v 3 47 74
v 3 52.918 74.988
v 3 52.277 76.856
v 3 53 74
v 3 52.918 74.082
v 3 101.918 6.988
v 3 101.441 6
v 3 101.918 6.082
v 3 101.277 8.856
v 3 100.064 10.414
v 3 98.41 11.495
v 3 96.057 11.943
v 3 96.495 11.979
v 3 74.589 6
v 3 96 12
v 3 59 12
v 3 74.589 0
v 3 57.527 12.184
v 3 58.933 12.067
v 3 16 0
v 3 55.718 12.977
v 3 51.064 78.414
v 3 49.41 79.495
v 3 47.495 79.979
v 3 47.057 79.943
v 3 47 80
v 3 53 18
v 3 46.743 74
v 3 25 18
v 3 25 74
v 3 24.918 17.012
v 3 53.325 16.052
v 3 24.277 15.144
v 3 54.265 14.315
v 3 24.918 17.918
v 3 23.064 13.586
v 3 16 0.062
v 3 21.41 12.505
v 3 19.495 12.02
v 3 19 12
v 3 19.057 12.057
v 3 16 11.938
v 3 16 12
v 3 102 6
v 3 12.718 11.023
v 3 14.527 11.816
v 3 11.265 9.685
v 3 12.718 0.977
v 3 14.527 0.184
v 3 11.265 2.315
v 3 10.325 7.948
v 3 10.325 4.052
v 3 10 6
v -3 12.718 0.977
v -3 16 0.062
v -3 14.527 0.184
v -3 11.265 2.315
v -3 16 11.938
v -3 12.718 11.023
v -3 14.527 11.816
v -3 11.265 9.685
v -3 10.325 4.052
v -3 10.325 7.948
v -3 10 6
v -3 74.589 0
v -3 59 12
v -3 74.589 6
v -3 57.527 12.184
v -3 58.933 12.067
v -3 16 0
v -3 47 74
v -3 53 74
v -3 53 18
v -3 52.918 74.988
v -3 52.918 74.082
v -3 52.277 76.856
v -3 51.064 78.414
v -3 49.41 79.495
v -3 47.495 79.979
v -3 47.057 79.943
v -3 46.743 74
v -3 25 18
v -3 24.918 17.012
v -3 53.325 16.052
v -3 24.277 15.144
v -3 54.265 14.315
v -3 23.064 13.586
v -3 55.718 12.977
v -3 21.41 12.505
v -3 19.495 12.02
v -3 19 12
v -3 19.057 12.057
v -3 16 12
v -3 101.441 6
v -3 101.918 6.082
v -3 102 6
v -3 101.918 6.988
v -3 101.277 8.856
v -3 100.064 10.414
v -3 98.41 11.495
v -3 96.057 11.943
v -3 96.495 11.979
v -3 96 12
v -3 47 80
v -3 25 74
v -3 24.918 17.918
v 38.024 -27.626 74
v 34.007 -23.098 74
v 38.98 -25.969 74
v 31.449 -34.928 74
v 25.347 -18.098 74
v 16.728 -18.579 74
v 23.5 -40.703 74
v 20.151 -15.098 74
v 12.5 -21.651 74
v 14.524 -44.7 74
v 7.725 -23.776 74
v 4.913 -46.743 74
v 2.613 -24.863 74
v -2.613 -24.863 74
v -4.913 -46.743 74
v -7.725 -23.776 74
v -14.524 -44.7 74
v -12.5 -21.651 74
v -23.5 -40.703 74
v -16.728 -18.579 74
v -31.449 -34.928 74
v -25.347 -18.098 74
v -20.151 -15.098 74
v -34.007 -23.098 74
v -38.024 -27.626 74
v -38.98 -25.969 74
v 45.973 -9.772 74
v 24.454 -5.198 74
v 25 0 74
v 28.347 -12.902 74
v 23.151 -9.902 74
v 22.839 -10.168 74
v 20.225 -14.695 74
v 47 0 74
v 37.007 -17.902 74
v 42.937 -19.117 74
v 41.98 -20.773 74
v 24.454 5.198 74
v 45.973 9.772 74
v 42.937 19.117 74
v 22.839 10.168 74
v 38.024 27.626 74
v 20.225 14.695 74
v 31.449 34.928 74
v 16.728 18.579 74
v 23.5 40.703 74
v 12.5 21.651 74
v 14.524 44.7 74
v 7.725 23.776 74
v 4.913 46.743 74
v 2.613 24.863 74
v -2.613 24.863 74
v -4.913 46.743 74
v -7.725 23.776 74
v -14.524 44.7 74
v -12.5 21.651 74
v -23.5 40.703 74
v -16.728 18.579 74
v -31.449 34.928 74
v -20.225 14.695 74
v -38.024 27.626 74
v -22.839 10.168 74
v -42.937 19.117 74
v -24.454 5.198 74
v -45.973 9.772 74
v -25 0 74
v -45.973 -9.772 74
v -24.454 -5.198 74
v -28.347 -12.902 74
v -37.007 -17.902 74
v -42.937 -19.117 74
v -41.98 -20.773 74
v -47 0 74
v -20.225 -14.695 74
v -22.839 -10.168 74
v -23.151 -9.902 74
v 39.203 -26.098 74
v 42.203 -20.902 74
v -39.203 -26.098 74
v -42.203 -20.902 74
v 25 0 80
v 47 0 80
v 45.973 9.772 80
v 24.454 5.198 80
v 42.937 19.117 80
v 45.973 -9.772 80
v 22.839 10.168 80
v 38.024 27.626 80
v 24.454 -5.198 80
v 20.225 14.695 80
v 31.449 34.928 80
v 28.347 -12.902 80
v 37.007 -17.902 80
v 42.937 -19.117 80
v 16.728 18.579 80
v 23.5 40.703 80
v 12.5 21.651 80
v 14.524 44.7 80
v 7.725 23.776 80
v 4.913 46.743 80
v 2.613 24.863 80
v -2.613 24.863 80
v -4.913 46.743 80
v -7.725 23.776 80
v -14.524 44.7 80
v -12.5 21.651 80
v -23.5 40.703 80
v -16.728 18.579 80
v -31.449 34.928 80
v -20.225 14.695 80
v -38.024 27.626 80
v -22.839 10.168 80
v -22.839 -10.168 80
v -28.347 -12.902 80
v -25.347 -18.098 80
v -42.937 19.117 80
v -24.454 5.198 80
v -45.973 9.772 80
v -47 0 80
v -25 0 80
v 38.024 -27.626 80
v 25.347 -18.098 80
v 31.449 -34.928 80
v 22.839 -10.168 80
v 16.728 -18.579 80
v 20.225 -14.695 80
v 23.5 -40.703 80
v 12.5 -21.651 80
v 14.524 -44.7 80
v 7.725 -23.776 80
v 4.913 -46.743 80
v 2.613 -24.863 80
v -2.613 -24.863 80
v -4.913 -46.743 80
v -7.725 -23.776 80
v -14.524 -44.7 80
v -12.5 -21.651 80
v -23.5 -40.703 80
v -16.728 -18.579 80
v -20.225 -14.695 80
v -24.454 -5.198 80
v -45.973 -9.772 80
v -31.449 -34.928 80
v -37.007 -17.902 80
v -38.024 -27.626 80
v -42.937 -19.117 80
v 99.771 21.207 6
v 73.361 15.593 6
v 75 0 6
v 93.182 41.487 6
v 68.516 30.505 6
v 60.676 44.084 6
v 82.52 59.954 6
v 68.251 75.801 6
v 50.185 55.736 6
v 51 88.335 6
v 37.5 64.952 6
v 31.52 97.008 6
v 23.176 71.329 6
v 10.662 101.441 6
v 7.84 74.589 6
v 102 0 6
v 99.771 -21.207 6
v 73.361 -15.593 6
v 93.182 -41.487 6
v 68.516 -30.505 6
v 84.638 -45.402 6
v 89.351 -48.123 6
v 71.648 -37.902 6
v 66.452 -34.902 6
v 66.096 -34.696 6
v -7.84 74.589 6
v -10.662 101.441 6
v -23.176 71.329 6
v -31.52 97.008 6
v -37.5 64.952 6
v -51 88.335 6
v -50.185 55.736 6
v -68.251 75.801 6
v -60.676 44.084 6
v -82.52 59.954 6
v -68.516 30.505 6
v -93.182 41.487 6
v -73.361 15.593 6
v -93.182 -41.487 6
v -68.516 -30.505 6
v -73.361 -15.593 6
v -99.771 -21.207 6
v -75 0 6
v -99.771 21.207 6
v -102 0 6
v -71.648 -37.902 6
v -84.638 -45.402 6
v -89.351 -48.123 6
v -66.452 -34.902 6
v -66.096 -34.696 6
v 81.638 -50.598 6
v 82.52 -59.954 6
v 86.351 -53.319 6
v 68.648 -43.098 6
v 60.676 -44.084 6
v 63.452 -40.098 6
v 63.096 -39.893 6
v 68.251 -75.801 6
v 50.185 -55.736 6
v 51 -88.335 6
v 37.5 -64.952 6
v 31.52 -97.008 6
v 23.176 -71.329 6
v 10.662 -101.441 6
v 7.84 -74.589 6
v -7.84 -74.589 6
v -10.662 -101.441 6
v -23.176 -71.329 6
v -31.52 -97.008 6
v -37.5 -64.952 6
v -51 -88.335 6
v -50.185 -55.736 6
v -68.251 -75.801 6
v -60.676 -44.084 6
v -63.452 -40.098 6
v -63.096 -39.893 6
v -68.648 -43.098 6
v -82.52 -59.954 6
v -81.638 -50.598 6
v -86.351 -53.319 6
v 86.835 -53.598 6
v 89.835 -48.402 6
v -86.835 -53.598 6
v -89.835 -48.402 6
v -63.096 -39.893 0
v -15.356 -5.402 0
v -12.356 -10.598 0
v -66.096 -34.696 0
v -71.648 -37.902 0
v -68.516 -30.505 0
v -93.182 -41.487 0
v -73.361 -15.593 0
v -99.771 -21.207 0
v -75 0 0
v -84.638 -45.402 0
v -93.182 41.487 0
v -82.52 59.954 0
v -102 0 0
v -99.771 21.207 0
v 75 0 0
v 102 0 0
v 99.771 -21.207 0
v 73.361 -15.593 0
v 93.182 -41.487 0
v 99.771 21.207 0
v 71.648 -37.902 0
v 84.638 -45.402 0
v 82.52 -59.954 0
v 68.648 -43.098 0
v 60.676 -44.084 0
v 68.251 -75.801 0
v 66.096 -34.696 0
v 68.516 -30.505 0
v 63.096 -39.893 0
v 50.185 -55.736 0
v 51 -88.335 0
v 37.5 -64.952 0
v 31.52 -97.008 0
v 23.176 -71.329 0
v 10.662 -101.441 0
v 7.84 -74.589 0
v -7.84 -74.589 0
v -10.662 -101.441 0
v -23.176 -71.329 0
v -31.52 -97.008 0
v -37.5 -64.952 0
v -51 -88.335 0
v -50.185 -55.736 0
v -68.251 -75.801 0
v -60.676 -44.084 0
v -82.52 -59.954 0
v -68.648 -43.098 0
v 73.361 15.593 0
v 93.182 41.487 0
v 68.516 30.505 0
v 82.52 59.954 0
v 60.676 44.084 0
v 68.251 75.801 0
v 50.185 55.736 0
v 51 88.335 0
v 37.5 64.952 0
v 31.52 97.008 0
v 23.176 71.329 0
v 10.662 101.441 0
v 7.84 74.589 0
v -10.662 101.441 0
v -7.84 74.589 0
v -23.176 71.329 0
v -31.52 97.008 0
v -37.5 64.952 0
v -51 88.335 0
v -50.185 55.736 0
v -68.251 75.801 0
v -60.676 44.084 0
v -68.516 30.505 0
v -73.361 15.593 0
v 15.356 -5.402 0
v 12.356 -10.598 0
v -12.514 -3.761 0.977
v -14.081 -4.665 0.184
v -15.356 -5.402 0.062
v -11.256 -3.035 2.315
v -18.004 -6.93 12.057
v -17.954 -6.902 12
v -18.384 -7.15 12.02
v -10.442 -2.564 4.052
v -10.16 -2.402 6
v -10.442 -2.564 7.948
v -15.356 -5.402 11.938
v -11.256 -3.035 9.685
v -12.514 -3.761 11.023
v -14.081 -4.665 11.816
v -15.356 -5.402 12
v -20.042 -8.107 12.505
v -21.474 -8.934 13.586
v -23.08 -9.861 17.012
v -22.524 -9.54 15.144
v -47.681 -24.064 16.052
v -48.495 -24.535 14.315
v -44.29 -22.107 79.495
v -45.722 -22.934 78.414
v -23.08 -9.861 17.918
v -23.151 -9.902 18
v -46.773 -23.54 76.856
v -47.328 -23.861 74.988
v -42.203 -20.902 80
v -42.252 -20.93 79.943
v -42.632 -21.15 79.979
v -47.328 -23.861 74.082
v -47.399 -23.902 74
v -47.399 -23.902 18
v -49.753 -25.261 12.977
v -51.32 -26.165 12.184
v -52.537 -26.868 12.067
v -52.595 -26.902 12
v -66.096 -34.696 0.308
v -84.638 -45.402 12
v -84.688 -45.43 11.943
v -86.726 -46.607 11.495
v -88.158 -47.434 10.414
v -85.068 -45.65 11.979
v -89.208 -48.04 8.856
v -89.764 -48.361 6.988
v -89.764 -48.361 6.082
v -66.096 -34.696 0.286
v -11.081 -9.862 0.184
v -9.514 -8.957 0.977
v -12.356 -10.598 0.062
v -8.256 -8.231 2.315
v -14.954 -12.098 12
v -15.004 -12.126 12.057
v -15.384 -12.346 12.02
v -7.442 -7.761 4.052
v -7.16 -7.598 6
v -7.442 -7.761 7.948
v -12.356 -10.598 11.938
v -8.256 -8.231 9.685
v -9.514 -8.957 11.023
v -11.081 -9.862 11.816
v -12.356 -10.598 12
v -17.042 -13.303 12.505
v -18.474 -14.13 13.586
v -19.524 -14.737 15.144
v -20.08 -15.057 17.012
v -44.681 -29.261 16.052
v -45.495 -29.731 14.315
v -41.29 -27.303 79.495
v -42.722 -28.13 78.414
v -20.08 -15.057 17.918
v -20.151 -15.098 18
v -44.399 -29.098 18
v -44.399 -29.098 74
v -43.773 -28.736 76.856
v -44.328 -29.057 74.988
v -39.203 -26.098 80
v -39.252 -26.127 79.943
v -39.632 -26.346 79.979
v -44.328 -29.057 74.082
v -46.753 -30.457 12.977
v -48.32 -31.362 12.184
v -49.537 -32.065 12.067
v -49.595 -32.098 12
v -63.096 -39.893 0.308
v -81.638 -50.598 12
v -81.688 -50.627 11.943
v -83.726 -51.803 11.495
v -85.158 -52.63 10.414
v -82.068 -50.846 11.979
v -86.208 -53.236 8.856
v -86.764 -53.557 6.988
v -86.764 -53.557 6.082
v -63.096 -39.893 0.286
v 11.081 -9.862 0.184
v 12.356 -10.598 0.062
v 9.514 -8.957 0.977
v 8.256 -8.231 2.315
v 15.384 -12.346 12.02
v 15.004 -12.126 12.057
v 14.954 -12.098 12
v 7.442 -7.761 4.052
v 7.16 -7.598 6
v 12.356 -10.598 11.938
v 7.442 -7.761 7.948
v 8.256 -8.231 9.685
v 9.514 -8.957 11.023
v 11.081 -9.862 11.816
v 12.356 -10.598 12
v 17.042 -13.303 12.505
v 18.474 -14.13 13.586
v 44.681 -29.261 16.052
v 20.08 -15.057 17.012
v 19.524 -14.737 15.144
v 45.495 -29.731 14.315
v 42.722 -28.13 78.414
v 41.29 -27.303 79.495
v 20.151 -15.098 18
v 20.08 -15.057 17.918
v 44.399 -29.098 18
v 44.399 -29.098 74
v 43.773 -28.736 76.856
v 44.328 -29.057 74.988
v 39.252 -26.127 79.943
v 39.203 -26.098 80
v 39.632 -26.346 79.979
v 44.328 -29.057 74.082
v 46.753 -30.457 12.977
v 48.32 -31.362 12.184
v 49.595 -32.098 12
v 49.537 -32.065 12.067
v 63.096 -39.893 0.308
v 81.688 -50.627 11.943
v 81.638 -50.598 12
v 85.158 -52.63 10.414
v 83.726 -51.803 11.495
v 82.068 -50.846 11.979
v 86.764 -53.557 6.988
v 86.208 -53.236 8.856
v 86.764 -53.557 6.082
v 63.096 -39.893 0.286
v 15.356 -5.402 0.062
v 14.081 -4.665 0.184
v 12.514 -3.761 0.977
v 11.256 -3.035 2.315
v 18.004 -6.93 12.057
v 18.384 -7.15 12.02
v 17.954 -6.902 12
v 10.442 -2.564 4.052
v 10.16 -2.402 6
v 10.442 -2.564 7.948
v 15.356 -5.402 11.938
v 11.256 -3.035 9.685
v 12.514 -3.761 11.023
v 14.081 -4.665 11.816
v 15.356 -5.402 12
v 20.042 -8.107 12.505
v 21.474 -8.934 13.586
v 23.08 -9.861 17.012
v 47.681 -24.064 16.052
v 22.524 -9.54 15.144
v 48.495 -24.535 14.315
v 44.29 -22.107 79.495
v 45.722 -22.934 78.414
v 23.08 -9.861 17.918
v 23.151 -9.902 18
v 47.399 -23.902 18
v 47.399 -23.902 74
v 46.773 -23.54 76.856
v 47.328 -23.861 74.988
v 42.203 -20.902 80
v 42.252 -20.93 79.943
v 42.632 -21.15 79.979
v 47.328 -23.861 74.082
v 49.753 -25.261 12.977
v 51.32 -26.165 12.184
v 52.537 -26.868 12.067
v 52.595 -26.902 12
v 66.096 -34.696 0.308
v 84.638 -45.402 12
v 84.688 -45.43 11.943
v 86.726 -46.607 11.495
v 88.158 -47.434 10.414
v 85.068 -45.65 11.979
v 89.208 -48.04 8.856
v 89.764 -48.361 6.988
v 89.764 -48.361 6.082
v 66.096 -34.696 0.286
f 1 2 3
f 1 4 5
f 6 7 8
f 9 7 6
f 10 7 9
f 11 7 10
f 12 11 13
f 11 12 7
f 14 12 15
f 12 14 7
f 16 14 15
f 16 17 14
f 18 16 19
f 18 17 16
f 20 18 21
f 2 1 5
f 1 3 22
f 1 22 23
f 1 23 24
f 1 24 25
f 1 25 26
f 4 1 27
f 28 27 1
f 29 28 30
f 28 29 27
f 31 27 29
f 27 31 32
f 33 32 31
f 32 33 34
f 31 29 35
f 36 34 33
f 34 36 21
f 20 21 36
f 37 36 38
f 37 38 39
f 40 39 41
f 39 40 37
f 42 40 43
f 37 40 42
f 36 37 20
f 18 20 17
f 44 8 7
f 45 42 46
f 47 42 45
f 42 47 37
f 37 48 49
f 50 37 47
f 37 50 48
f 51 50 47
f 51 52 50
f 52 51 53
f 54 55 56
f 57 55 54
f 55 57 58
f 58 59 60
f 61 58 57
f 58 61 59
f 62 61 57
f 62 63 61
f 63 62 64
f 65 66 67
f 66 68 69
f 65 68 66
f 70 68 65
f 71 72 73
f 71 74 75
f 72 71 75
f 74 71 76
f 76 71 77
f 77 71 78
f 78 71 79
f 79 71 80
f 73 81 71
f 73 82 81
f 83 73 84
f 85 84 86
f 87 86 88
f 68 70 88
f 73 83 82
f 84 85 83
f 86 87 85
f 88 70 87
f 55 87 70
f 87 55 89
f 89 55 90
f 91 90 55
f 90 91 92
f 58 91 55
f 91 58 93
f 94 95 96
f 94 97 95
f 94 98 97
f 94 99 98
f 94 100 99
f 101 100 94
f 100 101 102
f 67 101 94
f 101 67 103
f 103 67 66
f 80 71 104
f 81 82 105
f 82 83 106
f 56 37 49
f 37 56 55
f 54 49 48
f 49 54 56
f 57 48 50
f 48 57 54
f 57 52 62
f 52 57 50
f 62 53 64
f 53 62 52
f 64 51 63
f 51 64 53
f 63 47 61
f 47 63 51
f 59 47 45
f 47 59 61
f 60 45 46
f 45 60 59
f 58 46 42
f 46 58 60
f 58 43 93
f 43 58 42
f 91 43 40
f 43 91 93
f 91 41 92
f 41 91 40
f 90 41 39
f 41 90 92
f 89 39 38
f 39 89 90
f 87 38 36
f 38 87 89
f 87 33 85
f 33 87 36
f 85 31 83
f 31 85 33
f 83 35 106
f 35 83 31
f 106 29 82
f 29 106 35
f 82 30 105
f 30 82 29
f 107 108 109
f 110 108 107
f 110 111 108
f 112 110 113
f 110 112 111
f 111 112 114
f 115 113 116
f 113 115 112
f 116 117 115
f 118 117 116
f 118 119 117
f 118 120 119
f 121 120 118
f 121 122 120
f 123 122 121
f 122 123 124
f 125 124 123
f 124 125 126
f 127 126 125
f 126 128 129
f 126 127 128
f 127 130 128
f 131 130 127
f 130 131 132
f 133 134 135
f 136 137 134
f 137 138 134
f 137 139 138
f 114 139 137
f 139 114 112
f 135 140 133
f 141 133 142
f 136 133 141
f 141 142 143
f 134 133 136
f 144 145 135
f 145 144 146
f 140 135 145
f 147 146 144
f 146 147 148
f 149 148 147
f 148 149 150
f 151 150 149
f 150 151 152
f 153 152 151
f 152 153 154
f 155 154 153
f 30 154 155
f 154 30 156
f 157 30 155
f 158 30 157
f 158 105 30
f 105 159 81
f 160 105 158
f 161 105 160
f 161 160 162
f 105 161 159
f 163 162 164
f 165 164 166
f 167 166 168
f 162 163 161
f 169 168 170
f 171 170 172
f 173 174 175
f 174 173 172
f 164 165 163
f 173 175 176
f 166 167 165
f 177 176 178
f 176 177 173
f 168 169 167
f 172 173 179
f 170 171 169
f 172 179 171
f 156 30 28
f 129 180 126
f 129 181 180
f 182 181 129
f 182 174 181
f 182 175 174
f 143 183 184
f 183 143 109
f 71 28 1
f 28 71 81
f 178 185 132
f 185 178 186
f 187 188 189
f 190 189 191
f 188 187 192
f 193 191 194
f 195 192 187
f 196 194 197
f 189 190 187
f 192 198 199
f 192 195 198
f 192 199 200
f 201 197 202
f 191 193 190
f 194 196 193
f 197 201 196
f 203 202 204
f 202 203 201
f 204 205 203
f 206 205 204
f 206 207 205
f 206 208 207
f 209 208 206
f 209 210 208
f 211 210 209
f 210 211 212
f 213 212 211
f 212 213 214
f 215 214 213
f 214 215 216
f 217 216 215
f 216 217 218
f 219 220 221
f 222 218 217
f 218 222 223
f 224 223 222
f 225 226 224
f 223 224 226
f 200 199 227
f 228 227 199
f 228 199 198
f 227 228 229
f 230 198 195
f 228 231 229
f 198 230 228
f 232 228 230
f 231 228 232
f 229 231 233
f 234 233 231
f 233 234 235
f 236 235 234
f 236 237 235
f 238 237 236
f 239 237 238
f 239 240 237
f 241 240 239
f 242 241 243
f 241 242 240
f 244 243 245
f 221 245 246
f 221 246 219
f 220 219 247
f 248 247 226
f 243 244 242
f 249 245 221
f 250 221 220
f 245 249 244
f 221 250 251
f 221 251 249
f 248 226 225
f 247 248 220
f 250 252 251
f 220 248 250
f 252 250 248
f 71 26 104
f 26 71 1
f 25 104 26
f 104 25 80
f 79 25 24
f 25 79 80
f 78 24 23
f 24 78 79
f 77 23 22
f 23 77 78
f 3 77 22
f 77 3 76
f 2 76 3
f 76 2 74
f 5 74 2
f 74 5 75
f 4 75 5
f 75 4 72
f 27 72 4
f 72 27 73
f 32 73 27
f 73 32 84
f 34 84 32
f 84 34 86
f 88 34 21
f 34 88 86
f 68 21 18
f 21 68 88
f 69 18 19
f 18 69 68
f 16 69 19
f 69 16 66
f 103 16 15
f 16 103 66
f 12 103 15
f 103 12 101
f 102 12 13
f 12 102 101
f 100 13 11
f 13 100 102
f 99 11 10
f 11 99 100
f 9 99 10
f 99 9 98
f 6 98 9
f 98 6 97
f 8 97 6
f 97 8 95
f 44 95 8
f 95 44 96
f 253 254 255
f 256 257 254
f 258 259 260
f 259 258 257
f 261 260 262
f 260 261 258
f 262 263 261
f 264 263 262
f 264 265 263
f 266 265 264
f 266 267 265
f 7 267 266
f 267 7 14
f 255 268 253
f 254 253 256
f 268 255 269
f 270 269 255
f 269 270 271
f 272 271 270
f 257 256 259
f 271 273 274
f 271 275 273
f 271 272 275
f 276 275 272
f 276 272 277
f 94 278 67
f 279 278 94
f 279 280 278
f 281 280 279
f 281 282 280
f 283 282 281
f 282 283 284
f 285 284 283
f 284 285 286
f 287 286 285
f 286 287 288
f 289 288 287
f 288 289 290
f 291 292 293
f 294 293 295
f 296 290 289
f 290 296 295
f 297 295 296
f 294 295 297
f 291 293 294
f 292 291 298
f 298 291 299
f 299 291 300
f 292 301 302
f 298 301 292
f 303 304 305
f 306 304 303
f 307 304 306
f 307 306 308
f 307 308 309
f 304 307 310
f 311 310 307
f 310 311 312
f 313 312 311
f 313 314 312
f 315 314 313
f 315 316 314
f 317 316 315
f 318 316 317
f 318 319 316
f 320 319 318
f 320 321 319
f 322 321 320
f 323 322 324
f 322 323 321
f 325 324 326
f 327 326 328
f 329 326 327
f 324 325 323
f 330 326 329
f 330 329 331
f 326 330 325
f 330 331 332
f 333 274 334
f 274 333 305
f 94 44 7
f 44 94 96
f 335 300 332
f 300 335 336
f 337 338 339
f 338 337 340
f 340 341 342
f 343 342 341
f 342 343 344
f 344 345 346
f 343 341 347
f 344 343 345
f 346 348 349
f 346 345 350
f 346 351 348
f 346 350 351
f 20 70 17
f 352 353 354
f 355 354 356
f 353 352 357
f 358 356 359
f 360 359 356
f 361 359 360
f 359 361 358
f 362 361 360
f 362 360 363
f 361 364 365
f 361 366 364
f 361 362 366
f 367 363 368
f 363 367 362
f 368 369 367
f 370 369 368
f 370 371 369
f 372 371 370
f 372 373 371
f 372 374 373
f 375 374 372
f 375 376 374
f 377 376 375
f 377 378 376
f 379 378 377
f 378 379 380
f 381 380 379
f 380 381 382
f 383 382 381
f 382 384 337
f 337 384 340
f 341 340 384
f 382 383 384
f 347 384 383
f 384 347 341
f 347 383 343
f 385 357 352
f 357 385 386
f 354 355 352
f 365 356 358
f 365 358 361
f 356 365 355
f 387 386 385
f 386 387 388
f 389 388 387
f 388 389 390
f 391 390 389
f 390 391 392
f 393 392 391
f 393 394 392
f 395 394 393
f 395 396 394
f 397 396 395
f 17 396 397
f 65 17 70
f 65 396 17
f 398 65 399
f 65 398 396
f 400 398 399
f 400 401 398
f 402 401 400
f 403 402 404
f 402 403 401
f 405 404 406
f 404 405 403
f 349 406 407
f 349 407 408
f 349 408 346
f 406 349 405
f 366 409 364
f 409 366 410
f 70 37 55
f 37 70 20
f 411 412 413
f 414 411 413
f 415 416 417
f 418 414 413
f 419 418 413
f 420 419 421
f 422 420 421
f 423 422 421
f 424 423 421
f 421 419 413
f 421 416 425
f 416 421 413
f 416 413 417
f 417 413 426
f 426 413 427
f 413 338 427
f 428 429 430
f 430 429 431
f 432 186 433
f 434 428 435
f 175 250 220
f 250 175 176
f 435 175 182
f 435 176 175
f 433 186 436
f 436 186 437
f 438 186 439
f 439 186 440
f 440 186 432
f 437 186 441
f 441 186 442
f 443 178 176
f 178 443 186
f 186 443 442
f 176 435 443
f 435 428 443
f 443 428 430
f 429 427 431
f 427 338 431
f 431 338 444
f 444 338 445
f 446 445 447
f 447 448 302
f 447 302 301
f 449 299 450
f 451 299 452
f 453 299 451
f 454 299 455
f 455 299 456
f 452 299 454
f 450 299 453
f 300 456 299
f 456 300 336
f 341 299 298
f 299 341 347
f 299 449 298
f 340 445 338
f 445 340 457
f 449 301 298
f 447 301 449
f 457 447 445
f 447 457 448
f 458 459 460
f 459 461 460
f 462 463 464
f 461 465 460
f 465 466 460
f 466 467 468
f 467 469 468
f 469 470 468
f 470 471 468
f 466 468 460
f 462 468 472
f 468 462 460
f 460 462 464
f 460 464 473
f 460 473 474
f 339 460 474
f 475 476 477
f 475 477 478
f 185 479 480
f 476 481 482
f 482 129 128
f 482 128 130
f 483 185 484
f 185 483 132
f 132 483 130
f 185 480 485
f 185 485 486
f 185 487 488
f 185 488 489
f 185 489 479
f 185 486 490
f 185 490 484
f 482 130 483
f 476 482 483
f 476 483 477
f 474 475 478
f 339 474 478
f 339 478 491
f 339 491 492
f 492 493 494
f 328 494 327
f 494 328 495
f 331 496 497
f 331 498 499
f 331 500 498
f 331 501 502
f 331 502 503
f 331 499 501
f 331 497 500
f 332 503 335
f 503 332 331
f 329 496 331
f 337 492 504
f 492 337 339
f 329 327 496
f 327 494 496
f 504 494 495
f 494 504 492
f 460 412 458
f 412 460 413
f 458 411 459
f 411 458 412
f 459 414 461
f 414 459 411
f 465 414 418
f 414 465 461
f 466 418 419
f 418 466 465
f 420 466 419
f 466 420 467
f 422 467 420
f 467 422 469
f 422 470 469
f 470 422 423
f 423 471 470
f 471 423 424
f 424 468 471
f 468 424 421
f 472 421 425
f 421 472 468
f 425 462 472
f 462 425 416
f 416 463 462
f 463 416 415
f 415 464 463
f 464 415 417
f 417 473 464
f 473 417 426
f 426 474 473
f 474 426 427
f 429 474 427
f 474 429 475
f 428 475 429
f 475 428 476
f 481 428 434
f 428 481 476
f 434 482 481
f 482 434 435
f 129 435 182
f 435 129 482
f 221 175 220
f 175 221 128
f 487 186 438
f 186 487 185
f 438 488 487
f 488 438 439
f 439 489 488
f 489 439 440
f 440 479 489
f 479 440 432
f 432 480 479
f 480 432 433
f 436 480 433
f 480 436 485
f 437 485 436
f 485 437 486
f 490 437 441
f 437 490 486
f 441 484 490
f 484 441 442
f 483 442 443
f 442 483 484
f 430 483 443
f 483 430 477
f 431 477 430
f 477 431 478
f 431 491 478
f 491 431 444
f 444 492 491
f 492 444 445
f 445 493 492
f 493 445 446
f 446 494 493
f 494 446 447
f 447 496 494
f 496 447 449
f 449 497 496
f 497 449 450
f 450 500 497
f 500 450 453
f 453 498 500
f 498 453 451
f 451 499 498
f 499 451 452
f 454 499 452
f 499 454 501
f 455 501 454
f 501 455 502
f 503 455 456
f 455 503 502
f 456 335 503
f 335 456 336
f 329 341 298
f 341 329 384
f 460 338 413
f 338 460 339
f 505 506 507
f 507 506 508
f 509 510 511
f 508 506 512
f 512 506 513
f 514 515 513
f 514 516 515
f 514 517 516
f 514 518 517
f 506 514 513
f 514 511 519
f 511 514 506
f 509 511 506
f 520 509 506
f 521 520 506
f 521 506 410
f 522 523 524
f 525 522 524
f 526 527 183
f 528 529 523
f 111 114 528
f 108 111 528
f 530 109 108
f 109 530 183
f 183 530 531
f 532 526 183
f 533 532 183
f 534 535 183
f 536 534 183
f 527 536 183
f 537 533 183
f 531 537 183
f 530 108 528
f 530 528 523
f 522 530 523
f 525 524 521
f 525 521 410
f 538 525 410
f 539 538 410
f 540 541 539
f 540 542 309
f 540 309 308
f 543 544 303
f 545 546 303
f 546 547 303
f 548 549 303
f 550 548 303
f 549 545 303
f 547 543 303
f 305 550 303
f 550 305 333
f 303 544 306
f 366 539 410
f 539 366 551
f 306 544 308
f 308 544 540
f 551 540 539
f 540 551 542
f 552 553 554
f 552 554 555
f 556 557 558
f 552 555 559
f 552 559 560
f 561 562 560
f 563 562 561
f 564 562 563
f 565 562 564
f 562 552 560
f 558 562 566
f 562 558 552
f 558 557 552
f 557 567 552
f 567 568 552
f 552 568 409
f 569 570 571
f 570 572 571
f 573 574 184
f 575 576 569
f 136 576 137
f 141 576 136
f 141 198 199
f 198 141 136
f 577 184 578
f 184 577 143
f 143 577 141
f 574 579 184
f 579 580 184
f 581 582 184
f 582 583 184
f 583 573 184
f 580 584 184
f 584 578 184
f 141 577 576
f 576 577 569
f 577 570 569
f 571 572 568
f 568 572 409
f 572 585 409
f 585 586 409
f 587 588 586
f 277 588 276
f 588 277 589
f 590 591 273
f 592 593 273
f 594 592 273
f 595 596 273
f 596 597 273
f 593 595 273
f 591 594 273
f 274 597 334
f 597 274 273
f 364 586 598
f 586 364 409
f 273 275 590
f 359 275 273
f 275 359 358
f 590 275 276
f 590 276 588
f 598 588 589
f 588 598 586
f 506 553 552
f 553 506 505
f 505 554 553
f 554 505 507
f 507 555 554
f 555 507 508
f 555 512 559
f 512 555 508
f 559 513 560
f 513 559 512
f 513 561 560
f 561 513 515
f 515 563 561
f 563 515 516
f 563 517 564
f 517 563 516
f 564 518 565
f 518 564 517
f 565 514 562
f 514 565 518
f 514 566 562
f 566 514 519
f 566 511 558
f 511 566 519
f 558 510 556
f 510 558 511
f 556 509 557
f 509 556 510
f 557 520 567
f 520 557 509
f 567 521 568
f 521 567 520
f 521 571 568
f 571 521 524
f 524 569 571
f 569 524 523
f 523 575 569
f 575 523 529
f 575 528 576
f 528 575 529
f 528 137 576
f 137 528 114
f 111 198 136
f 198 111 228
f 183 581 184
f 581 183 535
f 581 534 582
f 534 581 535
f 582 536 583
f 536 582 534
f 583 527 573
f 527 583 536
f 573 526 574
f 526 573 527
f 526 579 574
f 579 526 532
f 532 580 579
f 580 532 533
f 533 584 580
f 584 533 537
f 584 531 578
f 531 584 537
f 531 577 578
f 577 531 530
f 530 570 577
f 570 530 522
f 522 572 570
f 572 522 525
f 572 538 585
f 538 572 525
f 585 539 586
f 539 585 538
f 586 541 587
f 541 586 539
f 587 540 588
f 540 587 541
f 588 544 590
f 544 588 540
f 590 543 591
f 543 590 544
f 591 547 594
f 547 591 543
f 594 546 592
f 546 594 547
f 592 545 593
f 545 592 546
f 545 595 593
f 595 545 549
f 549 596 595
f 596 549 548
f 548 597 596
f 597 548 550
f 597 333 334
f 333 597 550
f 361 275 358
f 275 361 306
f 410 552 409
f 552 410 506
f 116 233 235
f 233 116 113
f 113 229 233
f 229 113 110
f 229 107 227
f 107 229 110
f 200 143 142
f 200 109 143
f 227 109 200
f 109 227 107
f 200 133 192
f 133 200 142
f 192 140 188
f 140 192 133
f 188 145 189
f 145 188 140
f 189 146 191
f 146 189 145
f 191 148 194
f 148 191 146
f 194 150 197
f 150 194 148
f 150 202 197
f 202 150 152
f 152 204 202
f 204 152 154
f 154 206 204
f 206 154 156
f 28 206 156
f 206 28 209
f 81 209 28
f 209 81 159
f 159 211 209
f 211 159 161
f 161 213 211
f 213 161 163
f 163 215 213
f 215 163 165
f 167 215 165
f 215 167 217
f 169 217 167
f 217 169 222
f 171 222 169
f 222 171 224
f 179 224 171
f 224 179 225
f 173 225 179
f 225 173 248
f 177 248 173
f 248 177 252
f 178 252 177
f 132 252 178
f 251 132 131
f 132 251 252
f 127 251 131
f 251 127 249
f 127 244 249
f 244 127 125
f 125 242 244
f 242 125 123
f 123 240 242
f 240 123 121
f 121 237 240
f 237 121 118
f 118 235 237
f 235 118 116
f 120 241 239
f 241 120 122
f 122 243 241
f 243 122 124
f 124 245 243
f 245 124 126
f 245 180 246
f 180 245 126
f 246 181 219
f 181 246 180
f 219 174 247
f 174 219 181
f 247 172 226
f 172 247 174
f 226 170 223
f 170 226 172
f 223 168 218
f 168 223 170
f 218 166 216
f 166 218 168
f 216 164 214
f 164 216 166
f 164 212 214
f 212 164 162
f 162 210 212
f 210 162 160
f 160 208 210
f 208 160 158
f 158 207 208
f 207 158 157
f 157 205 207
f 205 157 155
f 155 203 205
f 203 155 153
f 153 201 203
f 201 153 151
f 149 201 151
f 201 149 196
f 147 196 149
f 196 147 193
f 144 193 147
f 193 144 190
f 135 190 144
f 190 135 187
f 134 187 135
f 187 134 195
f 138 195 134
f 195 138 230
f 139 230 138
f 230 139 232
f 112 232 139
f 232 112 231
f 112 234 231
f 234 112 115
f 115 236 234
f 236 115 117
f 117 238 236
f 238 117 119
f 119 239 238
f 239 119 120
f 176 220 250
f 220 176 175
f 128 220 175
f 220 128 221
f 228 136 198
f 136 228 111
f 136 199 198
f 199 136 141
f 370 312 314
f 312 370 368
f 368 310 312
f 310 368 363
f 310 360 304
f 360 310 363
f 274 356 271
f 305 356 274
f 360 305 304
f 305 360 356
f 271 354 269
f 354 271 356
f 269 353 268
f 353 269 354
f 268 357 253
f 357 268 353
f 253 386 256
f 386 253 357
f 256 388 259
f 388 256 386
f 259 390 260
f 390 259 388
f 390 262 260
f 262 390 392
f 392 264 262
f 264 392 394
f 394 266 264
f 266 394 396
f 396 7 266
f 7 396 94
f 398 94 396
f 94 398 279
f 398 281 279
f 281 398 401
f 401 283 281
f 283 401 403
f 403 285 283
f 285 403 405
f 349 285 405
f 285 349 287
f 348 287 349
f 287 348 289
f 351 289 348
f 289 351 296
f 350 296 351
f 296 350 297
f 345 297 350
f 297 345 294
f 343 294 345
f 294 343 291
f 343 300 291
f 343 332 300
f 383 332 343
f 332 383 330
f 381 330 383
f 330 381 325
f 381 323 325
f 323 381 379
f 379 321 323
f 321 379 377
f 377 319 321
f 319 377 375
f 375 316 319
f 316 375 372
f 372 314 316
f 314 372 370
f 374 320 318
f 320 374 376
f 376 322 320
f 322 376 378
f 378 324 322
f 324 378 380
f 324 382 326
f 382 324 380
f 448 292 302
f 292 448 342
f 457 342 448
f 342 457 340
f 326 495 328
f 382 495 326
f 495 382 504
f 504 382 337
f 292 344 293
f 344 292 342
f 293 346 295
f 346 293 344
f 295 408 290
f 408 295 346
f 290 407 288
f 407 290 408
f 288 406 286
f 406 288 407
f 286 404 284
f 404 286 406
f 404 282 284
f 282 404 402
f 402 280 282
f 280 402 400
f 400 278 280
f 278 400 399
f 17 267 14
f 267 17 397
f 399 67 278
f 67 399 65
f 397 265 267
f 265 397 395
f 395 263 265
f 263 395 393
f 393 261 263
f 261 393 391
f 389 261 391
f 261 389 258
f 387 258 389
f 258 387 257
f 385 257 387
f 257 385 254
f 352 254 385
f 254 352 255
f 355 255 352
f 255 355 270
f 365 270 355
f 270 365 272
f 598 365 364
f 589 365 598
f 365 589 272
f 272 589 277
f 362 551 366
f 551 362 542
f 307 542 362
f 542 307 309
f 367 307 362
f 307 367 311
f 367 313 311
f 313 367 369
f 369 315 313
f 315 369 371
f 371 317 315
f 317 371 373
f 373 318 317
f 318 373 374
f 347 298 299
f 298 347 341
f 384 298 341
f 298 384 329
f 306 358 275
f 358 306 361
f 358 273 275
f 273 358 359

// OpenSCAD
// To render the DXF file from the command line:
// openscad -o example017.dxf -D'mode="parts"' example017.scad

//Mode can be either "parts",  "exploded" or "assembled".
mode = "assembled";  // ["parts",  "exploded", "assembled"]

thickness = 6;
locklen1 = 15;
locklen2 = 10;
boltlen = 15;
midhole = 10;
inner1_to_inner2 = 50;
total_height = 80;

module shape_tripod() {
    x1 = 0;
    x2 = x1 + thickness;
    x3 = x2 + locklen1;
    x4 = x3 + thickness;
    x5 = x4 + inner1_to_inner2;
    x6 = x5 - thickness;
    x7 = x6 - locklen2;
    x8 = x7 - thickness;
    x9 = x8 - thickness;
    x10 = x9 - thickness;

    y1 = 0;
    y2 = y1 + thickness;
    y3 = y2 + thickness;
    y4 = y3 + thickness;
    y5 = y3 + total_height - 3 * thickness;
    y6 = y5 + thickness;

    union() {
        difference() {
            polygon(
                [
                    [x1, y2],
                    [x2, y2],
                    [x2, y1],
                    [x3, y1],
                    [x3, y2],
                    [x4, y2],
                    [x4, y1],
                    [x5, y1],
                    [x5 + thickness, y3],
                    [x5, y4],
                    [x5, y5],
                    [x6, y5],
                    [x6, y6],
                    [x7, y6],
                    [x7, y5],
                    [x8, y5],
                    [x8, y6],
                    [x9, y5],
                    [x9, y4],
                    [x10, y3],
                    [x2, y3]
                ]
            );
            translate([x10, y4]) circle(thickness);
            translate([x5 + thickness, y4]) circle(thickness);
        }

        translate([x5, y1]) square([boltlen - thickness, thickness * 2]);

        translate([x5 + boltlen - thickness, y2]) circle(thickness);

        translate([x2, y2]) intersection() {
            circle(thickness);
            translate([-thickness * 2, 0]) square(thickness * 2);
        };

        translate([x8, y5]) intersection() {
            circle(thickness);
            translate([-thickness * 2, 0]) square(thickness * 2);
        };
    }
}

module shape_inner_disc() {
    difference() {
        circle(midhole + boltlen + 2 * thickness + locklen2);
        for (alpha = [0, 120, 240]) {
            rotate(alpha) translate([0, midhole + boltlen + thickness + locklen2 / 2]) square([thickness, locklen2], true);
        }
        circle(midhole + boltlen);
    }
}

module shape_outer_disc() {
    difference() {
        circle(midhole + boltlen + inner1_to_inner2 + 2 * thickness + locklen1);
        for (alpha = [0, 120, 240]) {
            rotate(alpha) translate([0, midhole + boltlen + inner1_to_inner2 + thickness + locklen1 / 2]) square([thickness, locklen1], true);
        }
        circle(midhole + boltlen + inner1_to_inner2);
    }
}

module parts() {
    tripod_x_off = locklen1 - locklen2 + inner1_to_inner2;
    tripod_y_off = max(midhole + boltlen + inner1_to_inner2 + 4 * thickness + locklen1, total_height);

    shape_inner_disc();
    shape_outer_disc();

    for (s = [[1, 1], [-1, 1], [1, -1]]) {
        scale(s) translate([tripod_x_off, -tripod_y_off]) shape_tripod();
    }
}

module exploded() {
    translate([0, 0, total_height + 2 * thickness]) linear_extrude(height = thickness, convexity = 4) shape_inner_disc();
    linear_extrude(height = thickness, convexity = 4) shape_outer_disc();

    color([0.7, 0.7, 1])for (alpha = [0, 120, 240]) {
        rotate(alpha)
            translate([0, thickness * 2 + locklen1 + inner1_to_inner2 + boltlen + midhole, 1.5 * thickness])
                rotate([90, 0, -90])
                    linear_extrude(height = thickness, convexity = 10, center = true) shape_tripod();
    };
}

module bottle() {
    r = boltlen + midhole;
    h = total_height - thickness * 2;

    rotate_extrude(convexity = 2) {
        square([r, h]);

        translate([0, h]) {
            intersection() {
                square([r, r]);
                scale([1, 0.7]) circle(r);
            }
        }
        translate([0, h + r]) {
            intersection() {
                translate([0, -r / 2]) square([r / 2, r]);
                circle(r / 2);
            }
        }
    }
}

module assembled() {
    translate([0, 0, total_height - thickness]) linear_extrude(height = thickness, convexity = 4) shape_inner_disc();
    linear_extrude(height = thickness, convexity = 4) shape_outer_disc();

    color([0.7, 0.7, 1])for (alpha = [0, 120, 240]) {
        rotate(alpha)
            translate([0, thickness * 2 + locklen1 + inner1_to_inner2 + boltlen + midhole, 0])
                rotate([90, 0, -90])
                    linear_extrude(height = thickness, convexity = 10, center = true) shape_tripod();
    };

    %translate([0, 0, thickness * 2]) bottle();
}

echo(version = version());

if (mode == "parts") parts();

if (mode == "exploded") exploded();

if (mode == "assembled") assembled();

// Written by Clifford Wolf <clifford@clifford.at> and Marius
// Kintel <marius@kintel.net>
//
// To the extent possible under law, the author(s) have dedicated all
// copyright and related and neighboring rights to this software to the
// public domain worldwide. This software is distributed without any
// warranty.
//
// You should have received a copy of the CC0 Public Domain
// Dedication along with this software.
// If not, see <http://creativecommons.org/publicdomain/zero/1.0/>.
